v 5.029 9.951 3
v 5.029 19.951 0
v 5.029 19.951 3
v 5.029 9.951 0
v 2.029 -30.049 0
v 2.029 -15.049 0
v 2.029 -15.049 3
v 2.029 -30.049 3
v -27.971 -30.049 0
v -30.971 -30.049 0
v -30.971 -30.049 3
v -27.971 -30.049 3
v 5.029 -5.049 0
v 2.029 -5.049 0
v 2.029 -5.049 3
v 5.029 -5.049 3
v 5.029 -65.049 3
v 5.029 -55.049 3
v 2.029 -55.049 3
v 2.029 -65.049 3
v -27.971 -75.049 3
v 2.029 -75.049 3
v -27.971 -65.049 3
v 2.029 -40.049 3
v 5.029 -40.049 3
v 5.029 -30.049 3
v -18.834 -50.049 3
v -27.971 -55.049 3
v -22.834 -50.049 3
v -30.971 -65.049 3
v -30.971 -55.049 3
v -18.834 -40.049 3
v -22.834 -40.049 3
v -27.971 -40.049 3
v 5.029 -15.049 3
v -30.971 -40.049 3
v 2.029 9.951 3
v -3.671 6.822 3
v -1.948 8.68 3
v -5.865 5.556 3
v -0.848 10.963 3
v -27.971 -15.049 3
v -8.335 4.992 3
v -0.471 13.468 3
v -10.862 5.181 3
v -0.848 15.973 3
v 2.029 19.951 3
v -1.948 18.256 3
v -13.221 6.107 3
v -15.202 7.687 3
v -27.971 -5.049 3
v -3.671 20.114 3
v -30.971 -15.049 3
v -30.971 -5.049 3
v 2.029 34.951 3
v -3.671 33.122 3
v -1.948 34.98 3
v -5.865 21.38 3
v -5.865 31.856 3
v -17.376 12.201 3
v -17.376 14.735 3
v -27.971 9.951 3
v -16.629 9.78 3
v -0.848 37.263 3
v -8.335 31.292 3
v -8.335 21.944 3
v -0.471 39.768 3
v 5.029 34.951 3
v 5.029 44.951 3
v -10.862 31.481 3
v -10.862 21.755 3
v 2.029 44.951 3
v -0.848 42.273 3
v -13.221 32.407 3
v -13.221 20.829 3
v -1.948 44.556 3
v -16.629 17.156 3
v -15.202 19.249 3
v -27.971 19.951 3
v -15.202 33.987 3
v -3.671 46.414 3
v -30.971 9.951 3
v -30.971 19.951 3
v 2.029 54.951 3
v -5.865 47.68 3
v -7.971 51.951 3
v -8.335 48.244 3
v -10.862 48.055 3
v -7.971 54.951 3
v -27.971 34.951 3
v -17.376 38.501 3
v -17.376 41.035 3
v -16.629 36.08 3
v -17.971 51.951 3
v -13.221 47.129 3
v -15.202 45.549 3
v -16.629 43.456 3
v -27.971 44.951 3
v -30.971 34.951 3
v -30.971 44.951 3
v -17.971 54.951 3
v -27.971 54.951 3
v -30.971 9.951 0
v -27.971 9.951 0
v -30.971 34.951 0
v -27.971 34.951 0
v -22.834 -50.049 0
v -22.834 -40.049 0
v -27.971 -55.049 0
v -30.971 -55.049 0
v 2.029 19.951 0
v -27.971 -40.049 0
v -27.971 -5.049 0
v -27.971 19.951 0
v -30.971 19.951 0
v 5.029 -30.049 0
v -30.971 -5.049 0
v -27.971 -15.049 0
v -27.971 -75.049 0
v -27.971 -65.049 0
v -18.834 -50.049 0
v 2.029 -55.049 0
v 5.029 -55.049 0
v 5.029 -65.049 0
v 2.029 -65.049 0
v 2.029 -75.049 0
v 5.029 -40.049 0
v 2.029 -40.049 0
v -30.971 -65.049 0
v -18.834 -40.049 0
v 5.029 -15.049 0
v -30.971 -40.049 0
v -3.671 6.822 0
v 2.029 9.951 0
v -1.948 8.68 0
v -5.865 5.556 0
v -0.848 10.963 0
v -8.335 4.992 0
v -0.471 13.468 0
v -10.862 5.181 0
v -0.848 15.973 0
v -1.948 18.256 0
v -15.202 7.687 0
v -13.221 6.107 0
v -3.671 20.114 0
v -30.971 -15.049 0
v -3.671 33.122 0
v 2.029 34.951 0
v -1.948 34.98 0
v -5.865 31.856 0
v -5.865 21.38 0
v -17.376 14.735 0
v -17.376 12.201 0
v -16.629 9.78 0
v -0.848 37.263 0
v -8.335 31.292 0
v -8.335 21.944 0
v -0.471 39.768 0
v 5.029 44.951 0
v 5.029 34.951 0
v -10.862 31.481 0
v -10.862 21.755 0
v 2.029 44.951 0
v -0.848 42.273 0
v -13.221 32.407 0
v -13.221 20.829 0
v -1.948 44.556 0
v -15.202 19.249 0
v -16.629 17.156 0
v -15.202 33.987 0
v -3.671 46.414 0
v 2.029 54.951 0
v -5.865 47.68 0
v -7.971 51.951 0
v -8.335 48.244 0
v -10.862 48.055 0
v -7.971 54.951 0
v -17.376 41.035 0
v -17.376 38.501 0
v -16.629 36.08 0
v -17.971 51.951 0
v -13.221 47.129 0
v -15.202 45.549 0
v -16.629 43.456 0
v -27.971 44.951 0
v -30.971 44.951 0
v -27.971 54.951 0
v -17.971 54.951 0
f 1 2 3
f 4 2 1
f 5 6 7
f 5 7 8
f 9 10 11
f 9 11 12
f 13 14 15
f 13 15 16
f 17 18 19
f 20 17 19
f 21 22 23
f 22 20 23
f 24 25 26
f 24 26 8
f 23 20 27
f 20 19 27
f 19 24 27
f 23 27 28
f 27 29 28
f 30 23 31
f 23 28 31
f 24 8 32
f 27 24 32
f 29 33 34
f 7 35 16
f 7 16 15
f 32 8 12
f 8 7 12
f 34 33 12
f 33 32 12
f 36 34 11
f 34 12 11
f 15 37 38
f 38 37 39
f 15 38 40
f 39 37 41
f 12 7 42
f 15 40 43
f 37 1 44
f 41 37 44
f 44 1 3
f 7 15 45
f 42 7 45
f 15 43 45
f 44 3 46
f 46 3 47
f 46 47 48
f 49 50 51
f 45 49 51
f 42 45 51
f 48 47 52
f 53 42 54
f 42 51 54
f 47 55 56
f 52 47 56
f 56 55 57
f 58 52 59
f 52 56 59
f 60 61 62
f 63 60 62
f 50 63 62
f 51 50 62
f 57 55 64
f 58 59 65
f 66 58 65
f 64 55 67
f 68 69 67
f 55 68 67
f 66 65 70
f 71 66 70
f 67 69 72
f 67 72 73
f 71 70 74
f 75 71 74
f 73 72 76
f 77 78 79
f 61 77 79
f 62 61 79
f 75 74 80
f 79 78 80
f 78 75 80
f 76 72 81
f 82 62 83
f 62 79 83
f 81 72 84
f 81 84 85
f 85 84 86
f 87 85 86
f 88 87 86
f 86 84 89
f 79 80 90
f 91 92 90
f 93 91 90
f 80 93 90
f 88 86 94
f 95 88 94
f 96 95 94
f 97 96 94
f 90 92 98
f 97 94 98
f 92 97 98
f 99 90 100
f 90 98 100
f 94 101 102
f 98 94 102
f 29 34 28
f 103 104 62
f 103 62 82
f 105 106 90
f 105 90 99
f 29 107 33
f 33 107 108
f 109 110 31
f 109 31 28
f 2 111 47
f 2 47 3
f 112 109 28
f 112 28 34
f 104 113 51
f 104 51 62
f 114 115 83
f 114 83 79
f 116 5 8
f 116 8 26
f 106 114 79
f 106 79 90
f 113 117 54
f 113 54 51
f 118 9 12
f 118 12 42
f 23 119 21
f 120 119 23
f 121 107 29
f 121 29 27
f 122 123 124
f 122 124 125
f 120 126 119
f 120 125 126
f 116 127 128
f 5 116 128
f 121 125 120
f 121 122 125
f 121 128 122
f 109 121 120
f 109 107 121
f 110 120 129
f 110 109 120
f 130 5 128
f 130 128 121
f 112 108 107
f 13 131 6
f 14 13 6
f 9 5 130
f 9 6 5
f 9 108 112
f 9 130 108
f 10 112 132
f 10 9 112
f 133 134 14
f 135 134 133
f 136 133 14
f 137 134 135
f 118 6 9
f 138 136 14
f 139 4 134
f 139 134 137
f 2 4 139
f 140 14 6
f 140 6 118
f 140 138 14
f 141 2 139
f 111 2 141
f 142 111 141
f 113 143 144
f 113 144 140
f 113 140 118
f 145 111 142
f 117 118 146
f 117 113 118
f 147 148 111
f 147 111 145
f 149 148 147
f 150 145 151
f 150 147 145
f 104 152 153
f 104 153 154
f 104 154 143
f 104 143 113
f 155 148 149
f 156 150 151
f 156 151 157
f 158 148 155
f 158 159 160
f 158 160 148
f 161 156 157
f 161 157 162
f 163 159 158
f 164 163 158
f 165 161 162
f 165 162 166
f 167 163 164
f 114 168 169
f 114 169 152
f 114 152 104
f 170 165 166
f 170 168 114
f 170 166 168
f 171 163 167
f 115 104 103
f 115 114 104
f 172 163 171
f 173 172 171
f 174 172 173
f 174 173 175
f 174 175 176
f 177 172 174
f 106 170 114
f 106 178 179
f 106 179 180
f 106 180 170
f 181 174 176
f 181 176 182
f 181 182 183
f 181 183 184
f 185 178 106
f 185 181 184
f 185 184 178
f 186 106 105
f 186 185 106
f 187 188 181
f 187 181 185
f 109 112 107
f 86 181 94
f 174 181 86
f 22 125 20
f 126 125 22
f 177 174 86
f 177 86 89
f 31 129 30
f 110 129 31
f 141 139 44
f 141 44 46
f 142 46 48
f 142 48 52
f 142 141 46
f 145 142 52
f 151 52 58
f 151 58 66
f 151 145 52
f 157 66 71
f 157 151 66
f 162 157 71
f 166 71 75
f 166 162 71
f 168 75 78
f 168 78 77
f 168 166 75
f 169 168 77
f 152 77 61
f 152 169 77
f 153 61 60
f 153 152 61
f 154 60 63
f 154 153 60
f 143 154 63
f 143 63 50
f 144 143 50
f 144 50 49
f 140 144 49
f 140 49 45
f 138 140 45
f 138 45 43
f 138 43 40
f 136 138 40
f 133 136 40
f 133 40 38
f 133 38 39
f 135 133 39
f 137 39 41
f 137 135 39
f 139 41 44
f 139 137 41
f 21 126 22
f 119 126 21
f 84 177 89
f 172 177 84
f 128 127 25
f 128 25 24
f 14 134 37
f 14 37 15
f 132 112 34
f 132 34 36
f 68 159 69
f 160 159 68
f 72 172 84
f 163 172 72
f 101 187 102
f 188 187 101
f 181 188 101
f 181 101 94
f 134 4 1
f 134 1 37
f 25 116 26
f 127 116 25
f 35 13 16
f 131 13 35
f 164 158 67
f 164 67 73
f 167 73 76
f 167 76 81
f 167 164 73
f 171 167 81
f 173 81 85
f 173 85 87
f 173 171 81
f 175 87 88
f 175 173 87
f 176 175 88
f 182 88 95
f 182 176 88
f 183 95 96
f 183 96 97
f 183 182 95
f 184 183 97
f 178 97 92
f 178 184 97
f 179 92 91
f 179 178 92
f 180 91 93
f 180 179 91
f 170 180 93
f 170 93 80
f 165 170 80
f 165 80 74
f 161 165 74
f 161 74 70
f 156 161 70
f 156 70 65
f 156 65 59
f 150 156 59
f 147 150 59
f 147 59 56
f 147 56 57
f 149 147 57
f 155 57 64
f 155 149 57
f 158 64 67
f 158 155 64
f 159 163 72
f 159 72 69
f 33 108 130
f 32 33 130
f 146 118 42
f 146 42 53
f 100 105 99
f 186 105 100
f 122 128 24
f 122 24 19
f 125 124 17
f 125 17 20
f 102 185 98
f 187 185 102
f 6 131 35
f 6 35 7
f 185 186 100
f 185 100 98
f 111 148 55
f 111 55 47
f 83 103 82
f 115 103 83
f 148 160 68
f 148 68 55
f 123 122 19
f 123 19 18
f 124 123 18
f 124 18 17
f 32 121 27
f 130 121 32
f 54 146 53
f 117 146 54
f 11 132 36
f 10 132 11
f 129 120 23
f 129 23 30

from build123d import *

# Parameters (mm, degrees)
ESQUISSE1_R        = 8.5
ESQUISSE1_W        = 4
ESQUISSE1_H        = 10
BOSS_EXTRU_1_DEPTH = 3


with BuildPart() as part:
    # Esquisse1 → Boss.-Extru.1 (new body)
    with BuildSketch(Plane.XY):
        Polygon((2.029381216, -75.048859935), (-27.970618784, -75.048859935), (-27.970618784, -65.048859935), (-30.970618784, -65.048859935), (-30.970618784, -55.048859935), (-27.970618784, -55.048859935), (-27.970618784, -40.048859935), (-30.970618784, -40.048859935), (-30.970618784, -30.048859935), (-27.970618784, -30.048859935), (-27.970618784, -15.048859935), (-30.970618784, -15.048859935), (-30.970618784, -5.048859935), (-27.970618784, -5.048859935), (-27.970618784, 9.951140065), (-30.970618784, 9.951140065), (-30.970618784, 19.951140065), (-27.970618784, 19.951140065), (-27.970618784, 34.951140065), (-30.970618784, 34.951140065), (-30.970618784, 44.951140065), (-27.970618784, 44.951140065), (-27.970618784, 54.951140065), (-17.970618784, 54.951140065), (-17.970618784, 51.951140065), (-7.970618784, 51.951140065), (-7.970618784, 54.951140065), (2.029381216, 54.951140065), (2.029381216, 44.951140065), (5.029381216, 44.951140065), (5.029381216, 34.951140065), (2.029381216, 34.951140065), (2.029381216, 19.951140065), (5.029381216, 19.951140065), (5.029381216, 9.951140065), (2.029381216, 9.951140065), (2.029381216, -5.048859935), (5.029381216, -5.048859935), (5.029381216, -15.048859935), (2.029381216, -15.048859935), (2.029381216, -30.048859935), (5.029381216, -30.048859935), (5.029381216, -40.048859935), (2.029381216, -40.048859935), (2.029381216, -55.048859935), (5.029381216, -55.048859935), (5.029381216, -65.048859935), (2.029381216, -65.048859935), align=None)
        with Locations((-8.970618784, 39.768013852)):
            Circle(ESQUISSE1_R, mode=Mode.SUBTRACT)
        with Locations((-8.970618784, 13.468013852)):
            Circle(ESQUISSE1_R, mode=Mode.SUBTRACT)
        with Locations((-20.834297512, -45.048859935)):
            Rectangle(ESQUISSE1_W, ESQUISSE1_H, mode=Mode.SUBTRACT)
    extrude(amount=BOSS_EXTRU_1_DEPTH)


solid = part.part
